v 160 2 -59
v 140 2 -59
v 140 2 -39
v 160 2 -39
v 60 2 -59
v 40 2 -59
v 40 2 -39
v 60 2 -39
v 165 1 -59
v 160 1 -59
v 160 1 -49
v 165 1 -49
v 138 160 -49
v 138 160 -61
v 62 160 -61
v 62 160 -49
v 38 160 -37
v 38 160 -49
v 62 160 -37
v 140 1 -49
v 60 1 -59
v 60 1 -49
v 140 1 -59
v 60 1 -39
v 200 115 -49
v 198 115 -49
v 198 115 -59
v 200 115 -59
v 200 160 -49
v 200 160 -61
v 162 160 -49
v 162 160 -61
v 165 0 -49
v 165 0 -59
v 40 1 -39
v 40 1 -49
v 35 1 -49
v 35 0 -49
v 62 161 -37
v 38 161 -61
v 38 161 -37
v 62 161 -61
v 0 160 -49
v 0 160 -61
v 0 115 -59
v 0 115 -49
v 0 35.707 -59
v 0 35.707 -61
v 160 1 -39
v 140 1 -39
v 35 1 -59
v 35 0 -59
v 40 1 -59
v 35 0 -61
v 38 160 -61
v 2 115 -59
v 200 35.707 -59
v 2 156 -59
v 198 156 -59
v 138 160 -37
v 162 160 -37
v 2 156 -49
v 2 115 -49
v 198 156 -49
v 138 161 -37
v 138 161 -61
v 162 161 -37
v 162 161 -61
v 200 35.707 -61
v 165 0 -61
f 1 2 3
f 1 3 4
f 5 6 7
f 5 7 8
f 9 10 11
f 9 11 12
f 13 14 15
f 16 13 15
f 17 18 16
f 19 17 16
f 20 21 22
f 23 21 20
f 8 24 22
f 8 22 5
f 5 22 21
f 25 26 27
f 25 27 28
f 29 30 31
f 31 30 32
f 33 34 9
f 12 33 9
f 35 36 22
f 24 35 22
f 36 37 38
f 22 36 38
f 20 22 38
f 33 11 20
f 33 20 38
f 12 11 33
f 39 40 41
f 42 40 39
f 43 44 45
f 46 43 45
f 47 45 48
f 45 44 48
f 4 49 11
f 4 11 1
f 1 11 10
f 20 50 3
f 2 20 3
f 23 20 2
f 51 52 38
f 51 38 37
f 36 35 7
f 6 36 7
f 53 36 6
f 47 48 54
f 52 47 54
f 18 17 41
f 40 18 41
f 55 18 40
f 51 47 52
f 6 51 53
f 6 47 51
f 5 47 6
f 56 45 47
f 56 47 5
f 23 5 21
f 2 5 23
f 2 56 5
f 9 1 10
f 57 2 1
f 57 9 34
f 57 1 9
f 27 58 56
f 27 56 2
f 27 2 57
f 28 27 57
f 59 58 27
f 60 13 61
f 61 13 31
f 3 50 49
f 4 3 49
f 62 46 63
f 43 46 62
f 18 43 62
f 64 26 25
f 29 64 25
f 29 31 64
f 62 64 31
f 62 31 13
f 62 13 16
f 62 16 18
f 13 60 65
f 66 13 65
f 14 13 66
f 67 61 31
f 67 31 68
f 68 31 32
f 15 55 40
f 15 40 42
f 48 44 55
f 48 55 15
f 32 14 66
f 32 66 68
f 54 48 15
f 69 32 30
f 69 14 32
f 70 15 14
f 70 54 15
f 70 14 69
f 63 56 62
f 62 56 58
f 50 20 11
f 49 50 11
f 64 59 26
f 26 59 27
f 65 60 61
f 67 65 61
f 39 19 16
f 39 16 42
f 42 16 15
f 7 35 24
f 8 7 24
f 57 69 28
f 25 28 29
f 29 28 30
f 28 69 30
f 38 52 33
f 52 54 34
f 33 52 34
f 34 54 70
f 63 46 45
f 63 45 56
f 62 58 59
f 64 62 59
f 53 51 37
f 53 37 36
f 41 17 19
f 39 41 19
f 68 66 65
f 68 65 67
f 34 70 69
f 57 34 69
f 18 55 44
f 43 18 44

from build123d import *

# Parameters (mm, degrees)
STOCK_PART1_1_START       = -61
STOCK_PART1_1_DEPTH       = 2
STOCK_PART1_1_START_2     = -59
STOCK_PART1_1_2_OUTLINE_W = 130
STOCK_PART1_1_2_OUTLINE_H = 1
STOCK_PART1_1_2_DEPTH     = 10
SKETCH1_W                 = 24
SKETCH1_H                 = 24
BOSS_EXTRUDE1_DEPTH       = 1
SKETCH2_W                 = 20
SKETCH2_H                 = 20
BOSS_EXTRUDE2_DEPTH       = 1


# Read off the part's stored shape, not the designer's step: Stock-Part1-1
with BuildPart() as part:
    # Stock-Part1-1 outline → Stock-Part1-1 (new body)
    with BuildSketch(Plane.XY.offset(STOCK_PART1_1_START)):
        Polygon((0, 35.707142143), (35, 0), (165, 0), (200, 35.707142143), (200, 160), (0, 160), align=None)
    extrude(amount=STOCK_PART1_1_DEPTH)

    # Stock-Part1-1 2 outline → Stock-Part1-1 2 (add)
    with BuildSketch(Plane.XY.offset(STOCK_PART1_1_START_2)):
        with Locations((100, 0.5)):
            Rectangle(STOCK_PART1_1_2_OUTLINE_W, STOCK_PART1_1_2_OUTLINE_H)
        Polygon((198, 115), (200, 115), (200, 160), (0, 160), (0, 115), (2, 115), (2, 156), (198, 156), align=None)
    extrude(amount=STOCK_PART1_1_2_DEPTH)

    # Sketch1 → Boss-Extrude1 (add)
    with BuildSketch(Plane(origin=(0, 160, 0), x_dir=(1, 0, 0), z_dir=(0, 1, 0))):
        with Locations((150, 49)):
            Rectangle(SKETCH1_W, SKETCH1_H)
        with Locations((50, 49)):
            Rectangle(SKETCH1_W, SKETCH1_H)
    extrude(amount=BOSS_EXTRUDE1_DEPTH)

    # Sketch2 → Boss-Extrude2 (add)
    with BuildSketch(Plane(origin=(0, 1, 0), x_dir=(1, 0, 0), z_dir=(0, 1, 0))):
        with Locations((50, 49)):
            Rectangle(SKETCH2_W, SKETCH2_H)
        with Locations((150, 49)):
            Rectangle(SKETCH2_W, SKETCH2_H)
    extrude(amount=BOSS_EXTRUDE2_DEPTH)


solid = part.part
